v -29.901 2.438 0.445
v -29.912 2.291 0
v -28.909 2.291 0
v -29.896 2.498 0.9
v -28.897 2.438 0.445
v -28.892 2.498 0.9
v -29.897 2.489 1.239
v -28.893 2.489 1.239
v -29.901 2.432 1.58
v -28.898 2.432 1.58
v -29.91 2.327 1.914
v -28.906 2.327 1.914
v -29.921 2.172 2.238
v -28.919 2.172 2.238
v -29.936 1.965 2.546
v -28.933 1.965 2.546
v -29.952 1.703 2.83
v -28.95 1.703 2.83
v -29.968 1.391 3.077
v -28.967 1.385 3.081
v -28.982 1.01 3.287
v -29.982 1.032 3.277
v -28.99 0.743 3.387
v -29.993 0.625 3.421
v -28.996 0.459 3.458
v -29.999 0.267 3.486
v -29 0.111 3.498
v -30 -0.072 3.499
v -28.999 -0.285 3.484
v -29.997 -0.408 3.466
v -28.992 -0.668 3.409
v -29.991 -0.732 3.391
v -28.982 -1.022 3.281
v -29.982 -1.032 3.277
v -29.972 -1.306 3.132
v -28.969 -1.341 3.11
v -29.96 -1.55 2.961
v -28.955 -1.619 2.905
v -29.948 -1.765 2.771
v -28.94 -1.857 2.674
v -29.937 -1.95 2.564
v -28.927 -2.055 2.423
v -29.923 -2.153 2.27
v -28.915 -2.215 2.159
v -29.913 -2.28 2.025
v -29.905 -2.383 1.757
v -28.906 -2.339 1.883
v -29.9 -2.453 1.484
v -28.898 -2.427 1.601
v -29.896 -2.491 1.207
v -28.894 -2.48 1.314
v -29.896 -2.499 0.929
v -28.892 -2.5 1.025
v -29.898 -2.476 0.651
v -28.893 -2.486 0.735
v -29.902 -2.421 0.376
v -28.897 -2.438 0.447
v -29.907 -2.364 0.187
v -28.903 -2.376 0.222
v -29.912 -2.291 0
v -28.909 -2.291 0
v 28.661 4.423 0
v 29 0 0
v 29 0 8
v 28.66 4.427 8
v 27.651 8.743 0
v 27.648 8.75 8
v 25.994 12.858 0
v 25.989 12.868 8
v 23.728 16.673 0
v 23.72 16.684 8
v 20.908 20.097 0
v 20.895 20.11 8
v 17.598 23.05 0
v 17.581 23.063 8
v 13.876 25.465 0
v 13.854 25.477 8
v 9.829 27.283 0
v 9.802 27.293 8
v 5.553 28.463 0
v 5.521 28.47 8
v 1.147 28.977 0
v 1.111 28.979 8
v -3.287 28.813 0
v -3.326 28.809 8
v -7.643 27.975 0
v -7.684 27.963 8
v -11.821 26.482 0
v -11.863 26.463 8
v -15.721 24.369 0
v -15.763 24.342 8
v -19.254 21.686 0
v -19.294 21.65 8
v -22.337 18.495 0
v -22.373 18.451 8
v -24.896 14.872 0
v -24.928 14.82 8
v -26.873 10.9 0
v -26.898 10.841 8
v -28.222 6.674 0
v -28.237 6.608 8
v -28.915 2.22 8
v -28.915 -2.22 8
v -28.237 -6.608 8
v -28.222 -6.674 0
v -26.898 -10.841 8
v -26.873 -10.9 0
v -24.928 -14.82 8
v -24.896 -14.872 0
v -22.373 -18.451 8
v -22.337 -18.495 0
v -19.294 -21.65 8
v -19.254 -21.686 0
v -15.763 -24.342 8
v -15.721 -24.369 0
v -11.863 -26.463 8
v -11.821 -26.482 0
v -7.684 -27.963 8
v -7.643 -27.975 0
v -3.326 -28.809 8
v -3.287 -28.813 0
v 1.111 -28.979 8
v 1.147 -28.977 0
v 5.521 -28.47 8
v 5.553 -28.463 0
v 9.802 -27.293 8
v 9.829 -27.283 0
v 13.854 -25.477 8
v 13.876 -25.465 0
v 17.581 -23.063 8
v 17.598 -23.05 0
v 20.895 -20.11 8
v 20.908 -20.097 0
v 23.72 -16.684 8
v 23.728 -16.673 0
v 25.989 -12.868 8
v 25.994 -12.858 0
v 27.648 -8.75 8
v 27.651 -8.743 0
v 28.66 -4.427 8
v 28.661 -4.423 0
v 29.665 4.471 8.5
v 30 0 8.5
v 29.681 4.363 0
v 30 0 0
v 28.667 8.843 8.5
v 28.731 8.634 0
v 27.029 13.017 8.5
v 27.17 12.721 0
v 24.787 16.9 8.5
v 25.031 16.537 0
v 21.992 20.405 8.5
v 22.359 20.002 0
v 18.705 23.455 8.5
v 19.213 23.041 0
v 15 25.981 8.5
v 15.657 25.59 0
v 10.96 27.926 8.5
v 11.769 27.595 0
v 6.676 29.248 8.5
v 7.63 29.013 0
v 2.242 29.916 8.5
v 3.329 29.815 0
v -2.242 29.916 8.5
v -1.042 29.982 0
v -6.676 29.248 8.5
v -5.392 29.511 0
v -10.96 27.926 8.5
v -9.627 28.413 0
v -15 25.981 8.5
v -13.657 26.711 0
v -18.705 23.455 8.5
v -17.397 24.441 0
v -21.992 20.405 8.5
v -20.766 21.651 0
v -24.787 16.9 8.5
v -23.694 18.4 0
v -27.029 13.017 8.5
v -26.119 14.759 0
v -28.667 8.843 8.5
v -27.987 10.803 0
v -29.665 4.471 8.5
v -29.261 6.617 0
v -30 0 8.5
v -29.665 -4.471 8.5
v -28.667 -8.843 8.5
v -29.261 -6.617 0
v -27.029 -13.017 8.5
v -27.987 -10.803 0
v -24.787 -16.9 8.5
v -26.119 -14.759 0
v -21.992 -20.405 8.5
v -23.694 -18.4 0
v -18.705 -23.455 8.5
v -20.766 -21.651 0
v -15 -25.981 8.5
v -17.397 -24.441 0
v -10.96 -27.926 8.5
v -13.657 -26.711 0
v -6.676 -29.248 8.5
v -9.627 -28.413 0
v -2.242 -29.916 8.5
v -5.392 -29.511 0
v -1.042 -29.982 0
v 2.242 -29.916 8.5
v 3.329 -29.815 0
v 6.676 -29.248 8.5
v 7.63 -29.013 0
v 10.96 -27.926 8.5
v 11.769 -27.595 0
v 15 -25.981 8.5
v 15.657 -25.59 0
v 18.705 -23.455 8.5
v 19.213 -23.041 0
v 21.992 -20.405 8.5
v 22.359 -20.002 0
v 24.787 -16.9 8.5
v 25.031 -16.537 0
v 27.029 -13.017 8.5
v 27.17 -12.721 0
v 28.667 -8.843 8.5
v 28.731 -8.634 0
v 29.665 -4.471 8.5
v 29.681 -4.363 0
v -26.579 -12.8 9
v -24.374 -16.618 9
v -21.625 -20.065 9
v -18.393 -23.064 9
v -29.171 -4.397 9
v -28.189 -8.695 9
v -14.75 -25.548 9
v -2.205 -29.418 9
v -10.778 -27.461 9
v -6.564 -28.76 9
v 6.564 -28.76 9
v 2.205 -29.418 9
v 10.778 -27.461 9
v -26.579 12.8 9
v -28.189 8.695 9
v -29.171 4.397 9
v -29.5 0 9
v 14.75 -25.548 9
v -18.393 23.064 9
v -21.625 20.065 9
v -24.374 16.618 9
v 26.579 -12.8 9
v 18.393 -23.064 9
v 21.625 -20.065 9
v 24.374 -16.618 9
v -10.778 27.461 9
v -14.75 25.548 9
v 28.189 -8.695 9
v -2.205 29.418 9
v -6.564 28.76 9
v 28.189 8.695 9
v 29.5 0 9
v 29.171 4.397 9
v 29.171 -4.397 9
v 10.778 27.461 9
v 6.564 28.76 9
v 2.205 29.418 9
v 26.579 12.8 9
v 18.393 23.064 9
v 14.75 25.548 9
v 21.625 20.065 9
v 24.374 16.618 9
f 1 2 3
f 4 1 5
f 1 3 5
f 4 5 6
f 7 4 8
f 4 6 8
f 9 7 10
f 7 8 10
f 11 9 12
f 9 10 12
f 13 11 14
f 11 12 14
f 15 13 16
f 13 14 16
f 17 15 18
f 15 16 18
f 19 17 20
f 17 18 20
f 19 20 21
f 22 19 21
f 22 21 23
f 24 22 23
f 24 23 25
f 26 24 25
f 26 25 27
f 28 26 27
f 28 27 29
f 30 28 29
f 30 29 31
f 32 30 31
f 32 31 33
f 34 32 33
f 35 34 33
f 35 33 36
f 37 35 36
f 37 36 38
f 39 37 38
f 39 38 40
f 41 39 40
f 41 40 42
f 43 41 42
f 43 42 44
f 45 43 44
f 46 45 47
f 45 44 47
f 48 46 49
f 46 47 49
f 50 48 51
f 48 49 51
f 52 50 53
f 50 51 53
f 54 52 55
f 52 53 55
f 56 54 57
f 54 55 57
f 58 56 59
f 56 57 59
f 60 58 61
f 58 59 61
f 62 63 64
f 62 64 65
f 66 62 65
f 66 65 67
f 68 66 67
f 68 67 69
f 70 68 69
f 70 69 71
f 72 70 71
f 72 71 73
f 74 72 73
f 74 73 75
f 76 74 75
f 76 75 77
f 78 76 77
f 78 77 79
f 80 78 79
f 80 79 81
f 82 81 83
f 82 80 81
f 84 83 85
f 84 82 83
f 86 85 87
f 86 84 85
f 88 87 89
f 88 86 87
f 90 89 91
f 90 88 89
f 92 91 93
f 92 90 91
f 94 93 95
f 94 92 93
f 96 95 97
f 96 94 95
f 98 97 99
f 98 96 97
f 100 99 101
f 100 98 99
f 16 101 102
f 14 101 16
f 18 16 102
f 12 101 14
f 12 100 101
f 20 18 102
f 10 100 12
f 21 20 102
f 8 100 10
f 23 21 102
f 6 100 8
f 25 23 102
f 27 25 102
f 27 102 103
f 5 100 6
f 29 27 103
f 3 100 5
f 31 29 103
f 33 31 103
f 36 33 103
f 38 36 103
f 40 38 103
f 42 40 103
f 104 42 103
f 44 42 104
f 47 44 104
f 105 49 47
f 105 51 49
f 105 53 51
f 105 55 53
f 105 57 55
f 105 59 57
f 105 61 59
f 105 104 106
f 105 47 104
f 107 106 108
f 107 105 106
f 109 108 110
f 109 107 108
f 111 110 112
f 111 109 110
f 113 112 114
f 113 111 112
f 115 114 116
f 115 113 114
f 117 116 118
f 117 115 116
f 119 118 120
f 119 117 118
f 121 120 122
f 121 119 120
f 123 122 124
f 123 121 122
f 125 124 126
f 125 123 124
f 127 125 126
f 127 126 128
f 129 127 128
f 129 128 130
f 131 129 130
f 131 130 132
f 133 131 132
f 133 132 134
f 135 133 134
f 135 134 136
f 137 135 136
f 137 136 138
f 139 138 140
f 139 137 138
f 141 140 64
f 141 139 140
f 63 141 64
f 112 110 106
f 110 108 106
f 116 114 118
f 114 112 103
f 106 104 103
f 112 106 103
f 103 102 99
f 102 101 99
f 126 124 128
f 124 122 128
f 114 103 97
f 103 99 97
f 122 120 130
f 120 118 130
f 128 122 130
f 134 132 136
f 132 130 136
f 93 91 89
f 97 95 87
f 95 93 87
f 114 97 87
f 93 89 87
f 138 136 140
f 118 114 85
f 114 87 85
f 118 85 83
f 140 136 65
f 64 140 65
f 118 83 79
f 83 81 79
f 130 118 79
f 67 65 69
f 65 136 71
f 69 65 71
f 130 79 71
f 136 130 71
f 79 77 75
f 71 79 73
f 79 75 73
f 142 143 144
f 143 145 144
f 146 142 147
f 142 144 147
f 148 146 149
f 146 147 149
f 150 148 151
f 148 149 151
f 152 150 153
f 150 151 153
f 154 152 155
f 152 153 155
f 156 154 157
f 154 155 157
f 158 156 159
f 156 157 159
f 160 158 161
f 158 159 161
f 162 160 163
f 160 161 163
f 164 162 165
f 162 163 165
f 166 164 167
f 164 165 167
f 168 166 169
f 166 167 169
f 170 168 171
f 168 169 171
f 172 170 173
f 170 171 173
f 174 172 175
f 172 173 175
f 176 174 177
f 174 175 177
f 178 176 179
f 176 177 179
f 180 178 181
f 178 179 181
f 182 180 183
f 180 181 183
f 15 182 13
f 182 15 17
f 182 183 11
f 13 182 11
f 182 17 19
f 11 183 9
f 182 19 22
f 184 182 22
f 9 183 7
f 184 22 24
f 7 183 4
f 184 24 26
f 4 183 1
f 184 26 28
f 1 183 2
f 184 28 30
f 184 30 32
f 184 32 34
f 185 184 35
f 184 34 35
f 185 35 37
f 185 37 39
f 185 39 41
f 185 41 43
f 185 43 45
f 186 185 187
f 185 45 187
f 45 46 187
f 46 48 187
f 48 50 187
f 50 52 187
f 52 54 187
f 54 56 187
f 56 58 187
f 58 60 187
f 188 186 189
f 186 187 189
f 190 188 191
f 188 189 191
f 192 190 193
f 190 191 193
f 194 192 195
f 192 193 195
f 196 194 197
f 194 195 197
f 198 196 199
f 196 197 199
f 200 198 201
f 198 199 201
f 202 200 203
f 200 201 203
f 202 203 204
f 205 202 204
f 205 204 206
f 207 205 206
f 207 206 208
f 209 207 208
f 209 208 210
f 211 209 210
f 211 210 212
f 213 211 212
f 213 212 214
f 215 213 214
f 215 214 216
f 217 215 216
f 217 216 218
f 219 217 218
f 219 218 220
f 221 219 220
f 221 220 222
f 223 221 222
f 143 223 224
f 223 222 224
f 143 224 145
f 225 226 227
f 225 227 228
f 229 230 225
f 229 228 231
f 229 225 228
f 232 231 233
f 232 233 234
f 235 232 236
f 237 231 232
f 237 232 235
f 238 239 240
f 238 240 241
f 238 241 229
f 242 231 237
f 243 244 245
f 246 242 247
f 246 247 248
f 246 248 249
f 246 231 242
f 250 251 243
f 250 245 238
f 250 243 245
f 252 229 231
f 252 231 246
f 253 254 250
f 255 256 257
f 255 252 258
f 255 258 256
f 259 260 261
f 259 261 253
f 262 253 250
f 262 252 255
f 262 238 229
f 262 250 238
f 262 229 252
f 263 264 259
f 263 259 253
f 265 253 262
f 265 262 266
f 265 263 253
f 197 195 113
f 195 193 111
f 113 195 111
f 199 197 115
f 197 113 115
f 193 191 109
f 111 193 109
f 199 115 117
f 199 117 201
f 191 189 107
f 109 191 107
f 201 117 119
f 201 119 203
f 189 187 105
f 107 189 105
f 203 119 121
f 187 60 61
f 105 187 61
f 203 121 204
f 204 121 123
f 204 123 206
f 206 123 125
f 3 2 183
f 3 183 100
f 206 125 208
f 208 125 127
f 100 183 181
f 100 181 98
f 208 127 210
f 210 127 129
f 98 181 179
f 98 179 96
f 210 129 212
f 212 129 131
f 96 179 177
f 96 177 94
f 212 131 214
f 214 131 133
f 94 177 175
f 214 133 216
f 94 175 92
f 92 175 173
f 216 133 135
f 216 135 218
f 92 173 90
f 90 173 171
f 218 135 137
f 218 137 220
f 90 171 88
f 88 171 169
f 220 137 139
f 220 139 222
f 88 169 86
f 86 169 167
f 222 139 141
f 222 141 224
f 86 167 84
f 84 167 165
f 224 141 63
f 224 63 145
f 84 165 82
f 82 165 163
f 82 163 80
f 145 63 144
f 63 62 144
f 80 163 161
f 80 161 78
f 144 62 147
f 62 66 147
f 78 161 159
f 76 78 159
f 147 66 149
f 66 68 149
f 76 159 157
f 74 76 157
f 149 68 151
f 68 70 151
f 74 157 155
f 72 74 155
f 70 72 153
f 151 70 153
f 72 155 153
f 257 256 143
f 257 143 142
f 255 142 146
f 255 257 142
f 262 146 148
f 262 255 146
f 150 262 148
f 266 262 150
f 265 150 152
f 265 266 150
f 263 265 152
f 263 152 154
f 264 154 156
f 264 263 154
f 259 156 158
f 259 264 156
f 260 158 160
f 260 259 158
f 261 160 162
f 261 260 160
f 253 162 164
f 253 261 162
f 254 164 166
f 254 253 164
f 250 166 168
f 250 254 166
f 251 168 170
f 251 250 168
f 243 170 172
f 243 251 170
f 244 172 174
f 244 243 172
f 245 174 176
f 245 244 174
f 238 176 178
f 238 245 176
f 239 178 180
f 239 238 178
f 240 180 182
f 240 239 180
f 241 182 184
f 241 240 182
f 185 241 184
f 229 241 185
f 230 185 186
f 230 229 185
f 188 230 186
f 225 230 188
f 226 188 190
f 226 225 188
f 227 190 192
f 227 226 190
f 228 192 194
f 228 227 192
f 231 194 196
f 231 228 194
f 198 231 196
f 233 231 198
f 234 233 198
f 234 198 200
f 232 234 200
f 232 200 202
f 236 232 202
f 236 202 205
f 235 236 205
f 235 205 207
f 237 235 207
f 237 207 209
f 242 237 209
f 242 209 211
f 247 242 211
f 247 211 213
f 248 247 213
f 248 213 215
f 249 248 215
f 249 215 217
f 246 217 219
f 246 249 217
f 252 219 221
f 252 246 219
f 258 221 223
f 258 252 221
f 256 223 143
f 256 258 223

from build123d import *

# Parameters (mm, degrees)
SKETCH002_R  = 30
PAD004_DEPTH = 9
THICKNESS_T  = -1
CHAMFER_SIZE = 0.5
POCKET_DEPTH = 30.001


with BuildPart() as part:
    # Sketch002 → Pad004 (new body)
    with BuildSketch(Plane.XY):
        Circle(SKETCH002_R)
    extrude(amount=PAD004_DEPTH)

    # Thickness
    thickness_openings = [part.faces().sort_by_distance(p)[0] for p in [
        (0, 0, 0),
    ]]
    offset(amount=THICKNESS_T, openings=thickness_openings)

    # Chamfer
    chamfer_edges = [part.edges().sort_by_distance(p)[0] for p in [
        (-30, 0, 9),
    ]]
    chamfer(chamfer_edges, length=CHAMFER_SIZE)

    # Sketch003 → Pocket (cut, through all)
    with BuildSketch(Plane.YZ):
        with BuildLine():
            ThreePointArc((2.291288, 0), (0, 3.5), (-2.291288, 0))
            Line((-2.291288, 0), (2.291288, 0))
        make_face()
    extrude(amount=-POCKET_DEPTH, mode=Mode.SUBTRACT)


solid = part.part
